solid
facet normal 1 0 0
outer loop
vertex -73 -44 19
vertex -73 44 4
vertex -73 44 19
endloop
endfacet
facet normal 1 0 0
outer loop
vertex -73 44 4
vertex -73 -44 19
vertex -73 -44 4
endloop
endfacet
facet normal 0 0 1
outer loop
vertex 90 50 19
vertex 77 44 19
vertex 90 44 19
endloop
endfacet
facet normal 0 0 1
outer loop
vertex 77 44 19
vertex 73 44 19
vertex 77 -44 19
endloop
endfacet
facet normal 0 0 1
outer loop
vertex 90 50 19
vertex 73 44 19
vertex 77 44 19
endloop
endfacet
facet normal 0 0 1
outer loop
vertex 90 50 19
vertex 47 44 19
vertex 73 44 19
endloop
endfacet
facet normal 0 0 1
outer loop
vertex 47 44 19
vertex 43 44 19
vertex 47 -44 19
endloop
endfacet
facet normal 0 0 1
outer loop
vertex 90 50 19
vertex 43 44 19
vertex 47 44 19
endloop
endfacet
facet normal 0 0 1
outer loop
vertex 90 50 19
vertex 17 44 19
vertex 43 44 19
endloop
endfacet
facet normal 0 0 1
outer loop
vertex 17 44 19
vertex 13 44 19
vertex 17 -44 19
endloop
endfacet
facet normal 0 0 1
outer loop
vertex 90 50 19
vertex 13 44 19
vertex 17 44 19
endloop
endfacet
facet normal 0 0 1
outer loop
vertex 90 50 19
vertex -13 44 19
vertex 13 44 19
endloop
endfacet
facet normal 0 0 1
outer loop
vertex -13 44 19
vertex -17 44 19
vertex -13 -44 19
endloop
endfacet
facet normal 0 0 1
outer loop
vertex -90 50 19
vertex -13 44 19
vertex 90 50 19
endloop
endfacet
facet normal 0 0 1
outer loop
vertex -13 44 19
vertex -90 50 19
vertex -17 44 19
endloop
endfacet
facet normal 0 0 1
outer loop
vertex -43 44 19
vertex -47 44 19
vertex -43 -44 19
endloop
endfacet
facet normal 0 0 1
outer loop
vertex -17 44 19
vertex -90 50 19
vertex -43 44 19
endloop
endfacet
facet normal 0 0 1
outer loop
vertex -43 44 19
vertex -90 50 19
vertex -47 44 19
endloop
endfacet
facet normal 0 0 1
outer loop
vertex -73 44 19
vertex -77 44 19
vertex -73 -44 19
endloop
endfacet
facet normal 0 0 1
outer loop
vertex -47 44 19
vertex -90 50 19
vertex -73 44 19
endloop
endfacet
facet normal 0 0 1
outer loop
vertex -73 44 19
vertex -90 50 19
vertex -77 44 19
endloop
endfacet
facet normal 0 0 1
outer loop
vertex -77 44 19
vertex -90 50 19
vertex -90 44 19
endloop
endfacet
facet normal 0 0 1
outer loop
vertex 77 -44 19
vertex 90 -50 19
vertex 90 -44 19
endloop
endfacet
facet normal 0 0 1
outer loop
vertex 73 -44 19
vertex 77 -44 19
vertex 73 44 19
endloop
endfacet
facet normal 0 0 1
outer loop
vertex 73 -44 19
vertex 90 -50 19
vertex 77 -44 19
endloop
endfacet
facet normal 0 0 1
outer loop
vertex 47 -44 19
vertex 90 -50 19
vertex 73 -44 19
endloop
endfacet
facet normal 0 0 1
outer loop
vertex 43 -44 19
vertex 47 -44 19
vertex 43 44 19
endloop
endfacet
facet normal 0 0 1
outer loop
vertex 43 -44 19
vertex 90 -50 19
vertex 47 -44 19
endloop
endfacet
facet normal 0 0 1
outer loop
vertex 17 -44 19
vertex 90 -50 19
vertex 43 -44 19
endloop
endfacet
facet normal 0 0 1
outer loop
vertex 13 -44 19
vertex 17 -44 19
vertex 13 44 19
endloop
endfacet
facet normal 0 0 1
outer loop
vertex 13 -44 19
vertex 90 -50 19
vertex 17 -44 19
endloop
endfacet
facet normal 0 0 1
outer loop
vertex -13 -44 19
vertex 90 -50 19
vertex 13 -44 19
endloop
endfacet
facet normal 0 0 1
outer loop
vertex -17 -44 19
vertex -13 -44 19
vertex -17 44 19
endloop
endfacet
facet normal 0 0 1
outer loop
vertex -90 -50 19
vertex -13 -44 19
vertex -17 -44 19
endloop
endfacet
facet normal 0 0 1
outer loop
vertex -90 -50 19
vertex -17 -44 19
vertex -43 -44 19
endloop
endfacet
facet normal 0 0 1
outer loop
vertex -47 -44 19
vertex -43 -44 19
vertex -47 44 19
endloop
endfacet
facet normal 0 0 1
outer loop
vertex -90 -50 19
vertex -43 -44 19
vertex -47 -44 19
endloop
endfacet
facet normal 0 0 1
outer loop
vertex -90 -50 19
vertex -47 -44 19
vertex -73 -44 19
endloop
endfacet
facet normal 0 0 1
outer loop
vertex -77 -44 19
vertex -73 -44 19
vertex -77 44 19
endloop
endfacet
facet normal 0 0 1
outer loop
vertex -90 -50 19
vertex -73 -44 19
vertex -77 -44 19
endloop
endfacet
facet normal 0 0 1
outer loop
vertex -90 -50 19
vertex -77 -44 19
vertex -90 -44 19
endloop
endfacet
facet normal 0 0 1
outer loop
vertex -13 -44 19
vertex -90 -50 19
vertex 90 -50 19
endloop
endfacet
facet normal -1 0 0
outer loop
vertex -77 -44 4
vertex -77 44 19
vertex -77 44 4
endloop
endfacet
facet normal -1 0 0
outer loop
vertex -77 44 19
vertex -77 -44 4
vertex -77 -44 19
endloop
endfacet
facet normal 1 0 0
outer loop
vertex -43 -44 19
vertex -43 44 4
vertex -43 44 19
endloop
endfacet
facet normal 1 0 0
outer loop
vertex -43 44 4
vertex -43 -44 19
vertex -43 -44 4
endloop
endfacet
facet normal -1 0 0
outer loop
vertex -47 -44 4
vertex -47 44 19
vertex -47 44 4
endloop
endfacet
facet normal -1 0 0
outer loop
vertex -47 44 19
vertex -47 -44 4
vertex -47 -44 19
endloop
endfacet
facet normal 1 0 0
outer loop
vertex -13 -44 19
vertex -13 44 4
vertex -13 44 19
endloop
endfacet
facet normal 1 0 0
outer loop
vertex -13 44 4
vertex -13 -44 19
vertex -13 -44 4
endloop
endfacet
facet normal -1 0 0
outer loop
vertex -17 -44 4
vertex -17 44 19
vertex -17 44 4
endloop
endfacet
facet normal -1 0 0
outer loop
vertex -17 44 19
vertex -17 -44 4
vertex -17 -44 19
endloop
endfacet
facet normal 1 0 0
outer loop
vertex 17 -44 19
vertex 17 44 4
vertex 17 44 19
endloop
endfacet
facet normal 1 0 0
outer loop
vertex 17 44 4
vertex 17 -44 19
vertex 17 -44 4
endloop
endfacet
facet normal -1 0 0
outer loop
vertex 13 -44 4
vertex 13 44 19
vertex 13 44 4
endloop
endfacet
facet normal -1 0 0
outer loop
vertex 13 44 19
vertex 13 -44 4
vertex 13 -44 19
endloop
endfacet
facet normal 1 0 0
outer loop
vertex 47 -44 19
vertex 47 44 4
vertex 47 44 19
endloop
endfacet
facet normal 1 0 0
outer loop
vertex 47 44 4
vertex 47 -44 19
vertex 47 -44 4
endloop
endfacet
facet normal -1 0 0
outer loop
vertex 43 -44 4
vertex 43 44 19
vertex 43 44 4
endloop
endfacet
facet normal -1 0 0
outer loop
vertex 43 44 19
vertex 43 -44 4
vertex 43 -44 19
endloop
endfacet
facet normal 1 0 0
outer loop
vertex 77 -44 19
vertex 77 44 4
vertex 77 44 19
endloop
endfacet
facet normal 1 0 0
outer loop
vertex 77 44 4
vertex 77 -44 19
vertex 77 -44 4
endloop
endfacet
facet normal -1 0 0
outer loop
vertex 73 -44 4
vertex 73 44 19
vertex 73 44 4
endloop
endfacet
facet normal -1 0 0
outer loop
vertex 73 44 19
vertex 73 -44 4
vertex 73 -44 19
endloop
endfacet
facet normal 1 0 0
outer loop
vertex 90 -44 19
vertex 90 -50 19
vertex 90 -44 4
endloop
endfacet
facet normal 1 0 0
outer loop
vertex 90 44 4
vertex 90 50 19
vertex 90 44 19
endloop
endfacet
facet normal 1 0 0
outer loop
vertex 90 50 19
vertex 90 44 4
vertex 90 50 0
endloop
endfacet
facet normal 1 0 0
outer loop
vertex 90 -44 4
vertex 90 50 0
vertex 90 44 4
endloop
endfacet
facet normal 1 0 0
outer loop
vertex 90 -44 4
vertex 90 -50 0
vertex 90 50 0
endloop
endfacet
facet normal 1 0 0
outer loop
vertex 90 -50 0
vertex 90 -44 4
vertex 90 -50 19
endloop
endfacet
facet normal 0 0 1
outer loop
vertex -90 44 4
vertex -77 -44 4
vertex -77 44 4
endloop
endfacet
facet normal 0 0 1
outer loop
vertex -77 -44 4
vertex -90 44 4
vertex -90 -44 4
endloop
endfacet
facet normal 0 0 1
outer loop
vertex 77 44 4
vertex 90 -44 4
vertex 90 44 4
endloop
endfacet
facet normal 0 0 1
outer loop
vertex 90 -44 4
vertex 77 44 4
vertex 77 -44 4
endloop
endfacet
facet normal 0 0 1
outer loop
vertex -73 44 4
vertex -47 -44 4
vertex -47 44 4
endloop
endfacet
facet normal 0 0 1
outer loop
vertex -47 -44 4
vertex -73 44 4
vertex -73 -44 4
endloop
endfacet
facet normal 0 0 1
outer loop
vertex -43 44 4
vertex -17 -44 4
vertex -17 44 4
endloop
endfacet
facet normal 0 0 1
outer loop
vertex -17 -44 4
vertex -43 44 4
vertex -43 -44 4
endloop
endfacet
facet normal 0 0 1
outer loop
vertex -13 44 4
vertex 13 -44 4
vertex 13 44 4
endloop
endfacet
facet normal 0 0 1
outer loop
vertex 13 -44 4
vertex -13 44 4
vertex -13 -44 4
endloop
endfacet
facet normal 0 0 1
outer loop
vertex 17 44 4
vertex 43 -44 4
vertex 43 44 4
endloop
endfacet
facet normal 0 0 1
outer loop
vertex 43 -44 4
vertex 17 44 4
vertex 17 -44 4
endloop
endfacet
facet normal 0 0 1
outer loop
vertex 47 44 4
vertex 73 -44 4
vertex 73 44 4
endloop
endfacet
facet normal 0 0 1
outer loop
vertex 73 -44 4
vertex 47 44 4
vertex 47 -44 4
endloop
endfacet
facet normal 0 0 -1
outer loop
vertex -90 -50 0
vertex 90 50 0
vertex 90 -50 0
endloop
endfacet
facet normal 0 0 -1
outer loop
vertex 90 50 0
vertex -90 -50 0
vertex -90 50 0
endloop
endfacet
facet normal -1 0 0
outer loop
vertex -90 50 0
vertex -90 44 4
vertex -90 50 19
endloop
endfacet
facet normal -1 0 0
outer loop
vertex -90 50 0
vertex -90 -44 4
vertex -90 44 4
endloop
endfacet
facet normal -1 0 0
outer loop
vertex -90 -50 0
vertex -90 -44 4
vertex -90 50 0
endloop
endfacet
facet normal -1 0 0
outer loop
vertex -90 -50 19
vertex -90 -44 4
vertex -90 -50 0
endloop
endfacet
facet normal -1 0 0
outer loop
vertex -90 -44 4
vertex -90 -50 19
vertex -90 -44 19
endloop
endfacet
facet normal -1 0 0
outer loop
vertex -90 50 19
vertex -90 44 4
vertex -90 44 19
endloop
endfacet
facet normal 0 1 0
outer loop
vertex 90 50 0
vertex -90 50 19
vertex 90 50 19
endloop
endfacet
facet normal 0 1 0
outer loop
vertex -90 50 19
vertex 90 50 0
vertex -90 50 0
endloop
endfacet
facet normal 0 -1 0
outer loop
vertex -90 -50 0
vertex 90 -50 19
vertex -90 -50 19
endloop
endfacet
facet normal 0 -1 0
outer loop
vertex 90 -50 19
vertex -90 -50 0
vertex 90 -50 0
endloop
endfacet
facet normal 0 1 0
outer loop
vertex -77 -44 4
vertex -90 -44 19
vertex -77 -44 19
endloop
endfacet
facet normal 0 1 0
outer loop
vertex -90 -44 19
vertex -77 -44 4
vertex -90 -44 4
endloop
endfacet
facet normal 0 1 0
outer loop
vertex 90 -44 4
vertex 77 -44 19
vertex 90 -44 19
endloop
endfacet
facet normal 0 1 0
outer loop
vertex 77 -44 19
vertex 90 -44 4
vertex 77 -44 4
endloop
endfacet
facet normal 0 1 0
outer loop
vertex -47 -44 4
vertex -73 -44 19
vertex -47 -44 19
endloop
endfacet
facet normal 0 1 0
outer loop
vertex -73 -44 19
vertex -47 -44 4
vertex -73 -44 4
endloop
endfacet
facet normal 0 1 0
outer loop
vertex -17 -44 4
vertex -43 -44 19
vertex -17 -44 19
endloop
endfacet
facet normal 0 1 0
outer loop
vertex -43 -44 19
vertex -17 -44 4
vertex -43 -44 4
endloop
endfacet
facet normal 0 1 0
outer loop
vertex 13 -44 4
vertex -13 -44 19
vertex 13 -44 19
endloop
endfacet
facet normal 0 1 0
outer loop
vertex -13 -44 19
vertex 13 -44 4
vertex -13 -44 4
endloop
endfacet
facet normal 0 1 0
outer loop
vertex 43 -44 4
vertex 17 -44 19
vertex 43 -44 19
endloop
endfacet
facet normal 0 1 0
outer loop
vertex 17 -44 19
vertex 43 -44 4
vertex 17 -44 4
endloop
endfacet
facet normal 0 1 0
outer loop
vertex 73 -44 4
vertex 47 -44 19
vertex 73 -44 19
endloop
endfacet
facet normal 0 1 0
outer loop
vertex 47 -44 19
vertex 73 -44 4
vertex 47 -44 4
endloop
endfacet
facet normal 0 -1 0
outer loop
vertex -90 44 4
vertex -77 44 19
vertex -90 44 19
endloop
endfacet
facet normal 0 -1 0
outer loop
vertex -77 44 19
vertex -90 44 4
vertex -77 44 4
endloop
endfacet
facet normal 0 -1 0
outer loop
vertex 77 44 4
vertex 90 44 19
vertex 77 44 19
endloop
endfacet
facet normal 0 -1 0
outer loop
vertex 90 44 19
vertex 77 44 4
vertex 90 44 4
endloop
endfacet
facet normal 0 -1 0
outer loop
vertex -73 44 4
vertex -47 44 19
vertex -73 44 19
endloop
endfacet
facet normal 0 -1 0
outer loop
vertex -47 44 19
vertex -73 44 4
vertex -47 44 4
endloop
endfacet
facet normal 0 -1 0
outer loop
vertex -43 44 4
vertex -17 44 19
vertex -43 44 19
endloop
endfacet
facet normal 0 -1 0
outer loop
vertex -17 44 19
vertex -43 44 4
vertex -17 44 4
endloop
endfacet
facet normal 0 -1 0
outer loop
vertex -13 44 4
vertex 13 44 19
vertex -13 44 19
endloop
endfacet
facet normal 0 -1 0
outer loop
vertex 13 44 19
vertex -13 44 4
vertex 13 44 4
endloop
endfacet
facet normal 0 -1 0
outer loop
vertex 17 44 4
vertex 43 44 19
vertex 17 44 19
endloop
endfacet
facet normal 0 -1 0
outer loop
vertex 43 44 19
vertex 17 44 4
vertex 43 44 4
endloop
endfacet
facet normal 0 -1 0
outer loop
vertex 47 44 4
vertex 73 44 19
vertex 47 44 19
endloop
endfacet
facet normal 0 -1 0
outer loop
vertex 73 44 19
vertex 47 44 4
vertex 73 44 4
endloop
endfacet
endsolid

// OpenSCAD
$fn = 32;

// ----------------------------------------------------------------------
// Rib frame 180 x 100 x 19
// 6 ribs at 30 mm pitch
// ----------------------------------------------------------------------

// --- parameters (mm) ---
frame = [180, 100, 4];  // base plate size (x, y, z)
rail_w = 6;             // side rail width
ribs = 6;               // number of ribs
rib_t = 4;              // rib thickness
rib_h = 15;             // rib height above the base plate
pitch = 30;             // pitch between rib centres

// --- derived feature positions (mm) ---
span = (ribs - 1) * pitch;          // = 150   distance between the outer ribs
origin_x = -span / 2;               // = -75   X of the first rib
rib_len = frame[1] - 2 * rail_w + 2;  // = 90   rib length, 1 mm into each rail
feature_centers = [
  [origin_x + 0 * pitch, 0],
  [origin_x + 1 * pitch, 0],
  [origin_x + 2 * pitch, 0],
  [origin_x + 3 * pitch, 0],
  [origin_x + 4 * pitch, 0],
  [origin_x + 5 * pitch, 0]
];   // rib centre line, drives the rib loop

// base plate, two side rails, then the ribs read straight off feature_centers
union() {
  translate([-frame[0] / 2, -frame[1] / 2, 0]) cube(frame);
  translate([-frame[0] / 2, -frame[1] / 2, 0]) cube([frame[0], rail_w, frame[2] + rib_h]);
  translate([-frame[0] / 2, frame[1] / 2 - rail_w, 0]) cube([frame[0], rail_w, frame[2] + rib_h]);
  for (centre = feature_centers)
    translate([centre[0] - rib_t / 2, centre[1] - rib_len / 2, frame[2] - 1])
      cube([rib_t, rib_len, rib_h + 1]);
}
